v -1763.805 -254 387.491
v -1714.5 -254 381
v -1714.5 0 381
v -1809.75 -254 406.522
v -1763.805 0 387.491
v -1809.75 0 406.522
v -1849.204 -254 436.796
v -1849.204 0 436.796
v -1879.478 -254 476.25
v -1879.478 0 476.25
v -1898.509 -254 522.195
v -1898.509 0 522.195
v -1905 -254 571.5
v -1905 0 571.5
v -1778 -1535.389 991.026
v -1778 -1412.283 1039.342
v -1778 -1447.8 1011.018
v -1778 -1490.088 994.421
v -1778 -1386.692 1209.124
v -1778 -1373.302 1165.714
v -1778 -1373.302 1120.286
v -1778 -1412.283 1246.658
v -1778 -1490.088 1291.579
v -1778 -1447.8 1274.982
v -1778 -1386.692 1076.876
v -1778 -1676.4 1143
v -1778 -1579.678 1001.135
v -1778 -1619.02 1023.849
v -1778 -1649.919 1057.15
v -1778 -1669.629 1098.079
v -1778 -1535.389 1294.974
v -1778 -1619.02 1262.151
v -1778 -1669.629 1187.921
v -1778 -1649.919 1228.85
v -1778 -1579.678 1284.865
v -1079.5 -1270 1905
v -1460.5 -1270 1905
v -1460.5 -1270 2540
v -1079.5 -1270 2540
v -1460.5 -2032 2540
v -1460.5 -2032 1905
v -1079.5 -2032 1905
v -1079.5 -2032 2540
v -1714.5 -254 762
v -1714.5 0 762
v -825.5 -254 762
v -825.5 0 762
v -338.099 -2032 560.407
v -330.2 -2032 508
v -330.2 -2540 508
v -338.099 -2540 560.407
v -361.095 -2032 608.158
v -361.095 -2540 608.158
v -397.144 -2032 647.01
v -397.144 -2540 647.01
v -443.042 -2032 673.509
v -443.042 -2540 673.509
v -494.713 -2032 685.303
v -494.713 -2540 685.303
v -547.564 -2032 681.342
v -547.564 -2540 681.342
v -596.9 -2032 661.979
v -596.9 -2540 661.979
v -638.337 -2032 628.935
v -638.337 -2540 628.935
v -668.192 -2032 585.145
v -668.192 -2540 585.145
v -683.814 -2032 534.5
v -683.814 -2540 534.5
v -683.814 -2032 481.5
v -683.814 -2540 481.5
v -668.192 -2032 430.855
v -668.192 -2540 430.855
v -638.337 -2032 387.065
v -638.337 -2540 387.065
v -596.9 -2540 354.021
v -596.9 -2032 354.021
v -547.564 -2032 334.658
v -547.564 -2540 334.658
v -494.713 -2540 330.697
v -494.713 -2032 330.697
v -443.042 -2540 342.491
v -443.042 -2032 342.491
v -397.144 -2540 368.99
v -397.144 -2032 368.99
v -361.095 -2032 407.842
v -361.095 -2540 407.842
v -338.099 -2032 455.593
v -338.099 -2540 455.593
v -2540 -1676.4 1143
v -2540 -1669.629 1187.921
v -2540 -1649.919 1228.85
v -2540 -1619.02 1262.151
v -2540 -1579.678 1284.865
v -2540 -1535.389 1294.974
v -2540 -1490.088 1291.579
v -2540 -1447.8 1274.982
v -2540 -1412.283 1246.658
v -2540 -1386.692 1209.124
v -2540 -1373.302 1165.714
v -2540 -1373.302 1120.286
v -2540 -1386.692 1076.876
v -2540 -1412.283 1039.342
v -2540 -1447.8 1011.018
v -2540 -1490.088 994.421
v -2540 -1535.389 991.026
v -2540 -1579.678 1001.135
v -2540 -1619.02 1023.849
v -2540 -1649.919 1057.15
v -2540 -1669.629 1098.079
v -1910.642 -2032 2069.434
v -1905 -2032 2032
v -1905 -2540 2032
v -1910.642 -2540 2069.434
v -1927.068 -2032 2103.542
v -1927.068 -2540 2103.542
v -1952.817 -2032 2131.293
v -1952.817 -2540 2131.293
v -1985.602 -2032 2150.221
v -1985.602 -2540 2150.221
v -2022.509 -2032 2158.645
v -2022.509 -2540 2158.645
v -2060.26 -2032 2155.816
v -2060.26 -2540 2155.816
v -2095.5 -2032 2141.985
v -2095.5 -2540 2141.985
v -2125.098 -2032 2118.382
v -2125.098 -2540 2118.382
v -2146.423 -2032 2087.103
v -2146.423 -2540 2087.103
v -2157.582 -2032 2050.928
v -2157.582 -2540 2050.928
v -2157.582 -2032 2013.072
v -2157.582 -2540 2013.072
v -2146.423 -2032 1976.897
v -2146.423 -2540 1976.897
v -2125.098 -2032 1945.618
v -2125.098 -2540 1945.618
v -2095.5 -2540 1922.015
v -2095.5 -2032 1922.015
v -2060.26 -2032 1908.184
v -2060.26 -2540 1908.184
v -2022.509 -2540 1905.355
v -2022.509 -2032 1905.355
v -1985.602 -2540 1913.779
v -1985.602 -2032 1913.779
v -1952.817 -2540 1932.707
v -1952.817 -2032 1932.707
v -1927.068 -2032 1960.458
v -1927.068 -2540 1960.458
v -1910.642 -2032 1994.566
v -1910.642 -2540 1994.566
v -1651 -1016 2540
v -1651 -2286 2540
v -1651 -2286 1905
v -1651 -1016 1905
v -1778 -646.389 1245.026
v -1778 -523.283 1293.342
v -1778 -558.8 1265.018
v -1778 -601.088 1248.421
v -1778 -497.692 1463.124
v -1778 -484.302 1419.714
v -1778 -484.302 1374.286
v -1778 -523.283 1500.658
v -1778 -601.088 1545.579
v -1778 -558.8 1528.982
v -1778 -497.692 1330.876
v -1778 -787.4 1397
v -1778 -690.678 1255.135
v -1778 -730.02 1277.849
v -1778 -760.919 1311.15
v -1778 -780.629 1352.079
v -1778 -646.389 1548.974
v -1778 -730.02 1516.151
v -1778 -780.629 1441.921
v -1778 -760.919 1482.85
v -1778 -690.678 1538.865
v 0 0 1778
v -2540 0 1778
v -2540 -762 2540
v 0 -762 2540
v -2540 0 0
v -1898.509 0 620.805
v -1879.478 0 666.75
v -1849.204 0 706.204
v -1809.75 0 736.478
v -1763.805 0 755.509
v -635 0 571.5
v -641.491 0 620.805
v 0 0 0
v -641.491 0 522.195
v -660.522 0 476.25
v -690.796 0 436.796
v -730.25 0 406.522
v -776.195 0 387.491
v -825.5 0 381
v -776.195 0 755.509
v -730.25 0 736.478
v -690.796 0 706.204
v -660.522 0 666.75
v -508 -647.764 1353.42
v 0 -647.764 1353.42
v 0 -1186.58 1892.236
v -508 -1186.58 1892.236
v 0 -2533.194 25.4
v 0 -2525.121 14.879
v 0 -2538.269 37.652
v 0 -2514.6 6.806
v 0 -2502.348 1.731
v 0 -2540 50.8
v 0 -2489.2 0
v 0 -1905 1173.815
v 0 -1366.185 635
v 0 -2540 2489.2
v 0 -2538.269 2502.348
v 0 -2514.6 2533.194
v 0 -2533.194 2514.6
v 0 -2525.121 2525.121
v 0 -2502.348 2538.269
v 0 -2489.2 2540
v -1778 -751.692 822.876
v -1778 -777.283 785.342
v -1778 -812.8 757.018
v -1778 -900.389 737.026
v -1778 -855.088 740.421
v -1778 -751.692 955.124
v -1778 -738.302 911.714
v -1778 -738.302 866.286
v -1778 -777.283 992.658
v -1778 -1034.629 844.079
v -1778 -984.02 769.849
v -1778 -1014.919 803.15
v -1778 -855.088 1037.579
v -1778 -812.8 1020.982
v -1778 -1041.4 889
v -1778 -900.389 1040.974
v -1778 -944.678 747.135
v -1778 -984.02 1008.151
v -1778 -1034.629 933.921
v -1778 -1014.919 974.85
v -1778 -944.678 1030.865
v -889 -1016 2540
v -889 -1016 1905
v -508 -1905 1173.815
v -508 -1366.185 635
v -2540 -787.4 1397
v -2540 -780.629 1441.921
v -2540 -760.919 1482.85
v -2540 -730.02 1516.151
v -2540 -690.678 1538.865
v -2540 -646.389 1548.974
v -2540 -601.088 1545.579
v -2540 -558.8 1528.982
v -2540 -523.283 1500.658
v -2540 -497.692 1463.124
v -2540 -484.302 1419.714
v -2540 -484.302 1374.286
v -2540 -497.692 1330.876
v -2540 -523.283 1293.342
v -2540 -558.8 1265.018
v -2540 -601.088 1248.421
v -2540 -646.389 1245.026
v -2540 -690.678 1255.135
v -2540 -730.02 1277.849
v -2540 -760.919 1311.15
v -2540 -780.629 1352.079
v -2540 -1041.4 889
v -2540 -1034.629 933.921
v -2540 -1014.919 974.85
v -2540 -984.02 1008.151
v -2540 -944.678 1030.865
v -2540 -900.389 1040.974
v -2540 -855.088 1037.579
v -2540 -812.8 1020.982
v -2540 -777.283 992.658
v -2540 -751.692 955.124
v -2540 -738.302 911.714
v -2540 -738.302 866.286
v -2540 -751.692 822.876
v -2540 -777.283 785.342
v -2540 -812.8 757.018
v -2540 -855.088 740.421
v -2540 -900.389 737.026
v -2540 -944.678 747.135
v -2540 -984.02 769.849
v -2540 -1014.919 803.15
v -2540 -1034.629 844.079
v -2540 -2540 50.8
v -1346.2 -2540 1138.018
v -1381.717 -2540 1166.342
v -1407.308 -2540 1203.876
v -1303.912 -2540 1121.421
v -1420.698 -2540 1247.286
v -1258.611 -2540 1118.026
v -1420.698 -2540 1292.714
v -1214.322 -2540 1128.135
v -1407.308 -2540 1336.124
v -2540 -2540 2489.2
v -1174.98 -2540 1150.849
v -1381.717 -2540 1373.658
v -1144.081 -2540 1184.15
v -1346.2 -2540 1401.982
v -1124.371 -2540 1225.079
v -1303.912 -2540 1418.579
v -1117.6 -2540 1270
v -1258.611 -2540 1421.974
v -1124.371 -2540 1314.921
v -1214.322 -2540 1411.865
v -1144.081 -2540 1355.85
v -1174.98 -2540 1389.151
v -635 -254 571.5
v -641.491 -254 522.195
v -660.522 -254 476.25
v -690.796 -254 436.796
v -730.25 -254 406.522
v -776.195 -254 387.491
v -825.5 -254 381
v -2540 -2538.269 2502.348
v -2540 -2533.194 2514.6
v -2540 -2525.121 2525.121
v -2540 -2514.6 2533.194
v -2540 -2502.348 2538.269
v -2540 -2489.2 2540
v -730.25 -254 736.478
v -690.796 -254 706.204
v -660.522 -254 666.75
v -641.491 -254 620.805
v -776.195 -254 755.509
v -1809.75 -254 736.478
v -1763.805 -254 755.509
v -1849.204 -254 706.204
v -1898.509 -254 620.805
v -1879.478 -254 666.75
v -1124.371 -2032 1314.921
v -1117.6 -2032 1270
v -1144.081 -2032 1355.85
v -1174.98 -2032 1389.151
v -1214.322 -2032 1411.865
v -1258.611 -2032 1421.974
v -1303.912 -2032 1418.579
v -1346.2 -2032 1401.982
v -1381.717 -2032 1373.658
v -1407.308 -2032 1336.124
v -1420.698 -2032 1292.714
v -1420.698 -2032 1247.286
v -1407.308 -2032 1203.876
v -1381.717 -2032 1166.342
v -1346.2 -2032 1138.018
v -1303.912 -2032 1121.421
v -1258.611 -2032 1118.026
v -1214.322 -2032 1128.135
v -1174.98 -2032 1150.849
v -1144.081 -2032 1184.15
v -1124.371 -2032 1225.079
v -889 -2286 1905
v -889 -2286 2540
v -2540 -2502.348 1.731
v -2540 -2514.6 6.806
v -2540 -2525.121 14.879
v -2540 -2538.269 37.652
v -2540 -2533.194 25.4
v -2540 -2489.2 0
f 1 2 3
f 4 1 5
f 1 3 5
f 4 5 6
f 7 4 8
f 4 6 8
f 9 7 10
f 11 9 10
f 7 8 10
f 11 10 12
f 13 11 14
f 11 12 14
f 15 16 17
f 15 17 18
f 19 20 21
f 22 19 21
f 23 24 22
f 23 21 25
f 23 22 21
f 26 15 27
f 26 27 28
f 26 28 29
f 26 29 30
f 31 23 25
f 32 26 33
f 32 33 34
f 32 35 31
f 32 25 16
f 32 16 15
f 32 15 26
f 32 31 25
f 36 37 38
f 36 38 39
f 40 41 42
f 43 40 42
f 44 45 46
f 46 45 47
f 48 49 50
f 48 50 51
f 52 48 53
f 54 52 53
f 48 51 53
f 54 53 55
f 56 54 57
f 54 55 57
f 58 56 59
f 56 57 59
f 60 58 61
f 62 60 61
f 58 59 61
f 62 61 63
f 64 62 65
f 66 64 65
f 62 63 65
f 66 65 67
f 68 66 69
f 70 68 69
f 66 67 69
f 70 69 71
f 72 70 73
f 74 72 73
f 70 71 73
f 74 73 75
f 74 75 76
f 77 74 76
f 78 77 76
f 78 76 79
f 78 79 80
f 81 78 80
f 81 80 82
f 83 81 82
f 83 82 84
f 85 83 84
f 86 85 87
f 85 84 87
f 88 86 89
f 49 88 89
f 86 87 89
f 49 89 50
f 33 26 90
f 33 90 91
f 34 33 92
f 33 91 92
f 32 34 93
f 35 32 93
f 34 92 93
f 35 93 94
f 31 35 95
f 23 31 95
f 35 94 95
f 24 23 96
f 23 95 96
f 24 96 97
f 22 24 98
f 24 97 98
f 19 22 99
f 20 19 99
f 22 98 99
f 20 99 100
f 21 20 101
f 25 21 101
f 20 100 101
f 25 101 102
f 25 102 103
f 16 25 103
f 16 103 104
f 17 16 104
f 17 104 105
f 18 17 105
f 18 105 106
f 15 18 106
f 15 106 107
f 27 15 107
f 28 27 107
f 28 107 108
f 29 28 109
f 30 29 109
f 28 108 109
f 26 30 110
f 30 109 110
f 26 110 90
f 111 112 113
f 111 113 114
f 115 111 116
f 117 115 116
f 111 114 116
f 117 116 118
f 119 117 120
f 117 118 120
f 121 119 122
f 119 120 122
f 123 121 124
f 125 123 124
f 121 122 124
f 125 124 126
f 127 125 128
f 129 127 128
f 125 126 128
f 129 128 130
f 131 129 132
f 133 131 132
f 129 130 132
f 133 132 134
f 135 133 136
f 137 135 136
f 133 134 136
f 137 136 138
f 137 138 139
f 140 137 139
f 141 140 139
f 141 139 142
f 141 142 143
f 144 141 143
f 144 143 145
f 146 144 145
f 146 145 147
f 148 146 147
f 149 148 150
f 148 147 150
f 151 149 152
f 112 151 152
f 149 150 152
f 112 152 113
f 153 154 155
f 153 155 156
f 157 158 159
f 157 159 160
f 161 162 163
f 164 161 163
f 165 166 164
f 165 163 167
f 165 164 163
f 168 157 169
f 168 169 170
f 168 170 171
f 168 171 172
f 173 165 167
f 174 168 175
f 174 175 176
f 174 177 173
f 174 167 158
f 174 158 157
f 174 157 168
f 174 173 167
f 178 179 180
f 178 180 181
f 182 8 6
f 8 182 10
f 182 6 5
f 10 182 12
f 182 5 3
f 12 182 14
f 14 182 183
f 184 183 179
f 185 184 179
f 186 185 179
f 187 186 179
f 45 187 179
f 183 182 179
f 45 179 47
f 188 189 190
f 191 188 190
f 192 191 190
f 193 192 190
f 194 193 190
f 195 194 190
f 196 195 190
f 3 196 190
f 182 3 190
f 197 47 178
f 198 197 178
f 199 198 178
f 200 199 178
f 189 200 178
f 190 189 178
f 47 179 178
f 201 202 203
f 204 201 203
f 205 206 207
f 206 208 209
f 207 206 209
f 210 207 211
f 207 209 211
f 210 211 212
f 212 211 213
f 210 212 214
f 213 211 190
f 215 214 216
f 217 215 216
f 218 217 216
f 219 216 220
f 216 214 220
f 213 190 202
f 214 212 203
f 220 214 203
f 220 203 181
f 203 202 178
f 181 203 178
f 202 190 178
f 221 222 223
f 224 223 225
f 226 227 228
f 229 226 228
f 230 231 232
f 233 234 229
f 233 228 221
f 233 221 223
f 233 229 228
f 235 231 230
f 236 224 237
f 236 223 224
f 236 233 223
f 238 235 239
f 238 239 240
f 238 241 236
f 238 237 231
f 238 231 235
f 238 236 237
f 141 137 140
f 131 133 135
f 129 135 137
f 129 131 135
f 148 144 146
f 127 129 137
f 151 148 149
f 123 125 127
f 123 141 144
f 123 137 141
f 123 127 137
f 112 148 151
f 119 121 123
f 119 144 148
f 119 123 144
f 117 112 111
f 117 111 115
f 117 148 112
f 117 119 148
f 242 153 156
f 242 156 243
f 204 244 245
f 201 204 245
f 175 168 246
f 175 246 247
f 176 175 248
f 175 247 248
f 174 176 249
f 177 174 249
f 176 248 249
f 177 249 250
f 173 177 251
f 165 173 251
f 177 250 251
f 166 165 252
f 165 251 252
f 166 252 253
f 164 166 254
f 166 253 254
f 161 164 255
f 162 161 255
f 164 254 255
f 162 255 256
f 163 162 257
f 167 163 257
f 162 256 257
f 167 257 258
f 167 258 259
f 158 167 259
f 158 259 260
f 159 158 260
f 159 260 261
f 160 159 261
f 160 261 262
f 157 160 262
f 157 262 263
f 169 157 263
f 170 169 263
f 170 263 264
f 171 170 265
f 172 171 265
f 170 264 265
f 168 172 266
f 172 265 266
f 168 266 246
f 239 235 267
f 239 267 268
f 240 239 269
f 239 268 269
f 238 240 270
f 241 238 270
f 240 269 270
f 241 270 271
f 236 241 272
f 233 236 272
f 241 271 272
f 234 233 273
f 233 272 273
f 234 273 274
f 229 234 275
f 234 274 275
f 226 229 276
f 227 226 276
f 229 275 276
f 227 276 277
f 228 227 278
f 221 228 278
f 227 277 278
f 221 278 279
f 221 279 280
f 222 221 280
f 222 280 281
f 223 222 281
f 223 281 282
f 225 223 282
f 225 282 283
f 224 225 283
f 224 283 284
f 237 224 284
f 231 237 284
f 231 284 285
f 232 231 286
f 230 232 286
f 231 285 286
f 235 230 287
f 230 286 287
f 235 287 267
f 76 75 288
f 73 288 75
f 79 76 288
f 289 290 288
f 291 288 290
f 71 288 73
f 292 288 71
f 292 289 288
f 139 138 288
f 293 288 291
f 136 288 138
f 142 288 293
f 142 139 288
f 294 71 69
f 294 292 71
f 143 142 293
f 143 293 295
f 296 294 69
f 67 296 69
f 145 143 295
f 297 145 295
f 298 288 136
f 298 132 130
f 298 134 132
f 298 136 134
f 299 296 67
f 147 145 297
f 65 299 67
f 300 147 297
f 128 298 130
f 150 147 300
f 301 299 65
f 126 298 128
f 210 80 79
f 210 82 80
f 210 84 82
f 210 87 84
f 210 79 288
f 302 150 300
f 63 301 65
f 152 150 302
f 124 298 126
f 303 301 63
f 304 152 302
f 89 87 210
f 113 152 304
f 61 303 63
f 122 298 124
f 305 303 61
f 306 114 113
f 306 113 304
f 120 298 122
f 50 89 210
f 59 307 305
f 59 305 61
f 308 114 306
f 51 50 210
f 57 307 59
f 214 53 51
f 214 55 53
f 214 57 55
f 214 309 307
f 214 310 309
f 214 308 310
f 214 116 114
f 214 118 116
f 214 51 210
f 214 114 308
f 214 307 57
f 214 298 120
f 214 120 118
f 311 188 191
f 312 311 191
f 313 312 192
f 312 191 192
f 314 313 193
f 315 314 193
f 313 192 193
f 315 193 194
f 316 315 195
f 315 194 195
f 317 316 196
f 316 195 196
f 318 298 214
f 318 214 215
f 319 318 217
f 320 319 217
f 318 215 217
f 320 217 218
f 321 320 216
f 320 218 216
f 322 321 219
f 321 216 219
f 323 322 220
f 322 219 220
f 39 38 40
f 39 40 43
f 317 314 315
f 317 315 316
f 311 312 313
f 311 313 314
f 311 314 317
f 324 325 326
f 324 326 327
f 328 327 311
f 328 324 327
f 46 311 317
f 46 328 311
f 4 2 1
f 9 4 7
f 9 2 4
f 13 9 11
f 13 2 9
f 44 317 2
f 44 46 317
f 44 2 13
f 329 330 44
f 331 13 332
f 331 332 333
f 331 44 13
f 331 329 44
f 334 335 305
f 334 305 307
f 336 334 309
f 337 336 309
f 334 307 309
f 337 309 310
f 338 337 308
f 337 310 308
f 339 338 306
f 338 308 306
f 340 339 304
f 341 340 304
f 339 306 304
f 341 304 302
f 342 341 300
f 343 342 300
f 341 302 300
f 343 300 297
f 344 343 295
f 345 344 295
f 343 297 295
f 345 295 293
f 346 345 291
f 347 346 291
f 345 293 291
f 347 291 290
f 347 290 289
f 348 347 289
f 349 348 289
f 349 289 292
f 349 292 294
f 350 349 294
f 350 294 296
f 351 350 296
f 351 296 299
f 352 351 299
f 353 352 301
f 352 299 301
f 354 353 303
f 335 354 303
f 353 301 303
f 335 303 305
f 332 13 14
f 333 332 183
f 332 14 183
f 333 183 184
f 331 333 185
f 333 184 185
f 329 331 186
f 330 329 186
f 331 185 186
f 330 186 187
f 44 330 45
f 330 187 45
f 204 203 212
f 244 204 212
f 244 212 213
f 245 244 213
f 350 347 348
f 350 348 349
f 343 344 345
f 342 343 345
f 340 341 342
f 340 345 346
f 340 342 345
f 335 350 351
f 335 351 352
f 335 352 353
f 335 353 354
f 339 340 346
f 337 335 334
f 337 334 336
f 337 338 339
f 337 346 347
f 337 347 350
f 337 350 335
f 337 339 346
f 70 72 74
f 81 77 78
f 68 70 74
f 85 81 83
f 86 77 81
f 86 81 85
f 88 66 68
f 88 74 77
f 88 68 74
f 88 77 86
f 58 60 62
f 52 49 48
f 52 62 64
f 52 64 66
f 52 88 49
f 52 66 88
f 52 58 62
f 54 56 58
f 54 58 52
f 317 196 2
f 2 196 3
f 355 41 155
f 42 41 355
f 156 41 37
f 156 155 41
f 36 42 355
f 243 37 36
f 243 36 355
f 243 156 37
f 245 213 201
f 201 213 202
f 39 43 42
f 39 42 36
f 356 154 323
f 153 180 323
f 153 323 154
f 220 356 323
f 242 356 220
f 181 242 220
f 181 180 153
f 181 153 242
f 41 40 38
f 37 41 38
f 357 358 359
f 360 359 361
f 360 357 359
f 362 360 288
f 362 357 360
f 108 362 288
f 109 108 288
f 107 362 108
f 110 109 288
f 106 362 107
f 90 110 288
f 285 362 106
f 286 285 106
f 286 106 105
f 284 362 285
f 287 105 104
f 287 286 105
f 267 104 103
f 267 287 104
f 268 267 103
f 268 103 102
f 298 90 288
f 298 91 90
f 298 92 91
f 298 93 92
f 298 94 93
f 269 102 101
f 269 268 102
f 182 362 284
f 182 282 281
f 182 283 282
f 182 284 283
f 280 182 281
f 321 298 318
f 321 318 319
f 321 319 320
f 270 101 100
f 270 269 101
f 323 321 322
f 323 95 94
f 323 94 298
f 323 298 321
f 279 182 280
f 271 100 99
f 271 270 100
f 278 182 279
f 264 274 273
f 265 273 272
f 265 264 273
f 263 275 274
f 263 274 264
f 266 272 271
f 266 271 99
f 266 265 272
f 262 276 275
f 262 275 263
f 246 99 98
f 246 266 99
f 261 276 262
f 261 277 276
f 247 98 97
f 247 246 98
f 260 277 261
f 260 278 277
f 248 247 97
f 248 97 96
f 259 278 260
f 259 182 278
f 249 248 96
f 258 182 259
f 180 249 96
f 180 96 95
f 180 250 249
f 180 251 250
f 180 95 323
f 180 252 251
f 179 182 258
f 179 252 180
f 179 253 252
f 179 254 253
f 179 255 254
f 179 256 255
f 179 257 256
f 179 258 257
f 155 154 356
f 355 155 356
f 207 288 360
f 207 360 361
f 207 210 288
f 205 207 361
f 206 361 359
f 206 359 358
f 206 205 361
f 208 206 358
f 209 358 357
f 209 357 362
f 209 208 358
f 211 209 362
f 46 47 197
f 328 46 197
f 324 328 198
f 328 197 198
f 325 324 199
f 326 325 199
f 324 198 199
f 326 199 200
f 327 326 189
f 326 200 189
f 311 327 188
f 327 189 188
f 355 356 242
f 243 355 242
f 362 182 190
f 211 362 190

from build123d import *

# Parameters (mm, degrees)
F0_W      = 2540
F0_H      = 2540
F1_DEPTH  = 2540
F2_SIZE2  = 762
F2_SIZE   = 762
F3_W      = 762
F3_H      = 1270
F3_W_2    = 381
F3_H_2    = 762
F4_DEPTH  = 635
F6_DEPTH  = 508
F7_R      = 127
F7_R_2    = 152.4
F7_R_3    = 177.8
F8_DEPTH  = 508
F11_DEPTH = 254
F12_R     = 50.8
F13_R     = 50.8
F9_R      = 152.4
F14_DEPTH = 762


with BuildPart() as f1:
    # F0 (on Front) → F1 (new body)
    with BuildSketch(Plane.XZ):
        with Locations((-1270, 1270)):
            Rectangle(F0_W, F0_H)
    extrude(amount=F1_DEPTH)

    # F2
    f2_edges = [f1.edges().sort_by_distance(p)[0] for p in [
        (-1270, 0, 2540),
    ]]
    chamfer(f2_edges, length=F2_SIZE, length2=F2_SIZE2)

    # F3 (on face) → F4 (cut)
    with BuildSketch(Plane.XY.offset(2540)):
        with Locations((-1270, -1651)):
            Rectangle(F3_W, F3_H)
        with Locations((-1270, -1651)):
            Rectangle(F3_W_2, F3_H_2, mode=Mode.SUBTRACT)
    extrude(amount=-F4_DEPTH, mode=Mode.SUBTRACT)

    # F5 (on face) → F6 (cut)
    with BuildSketch(Plane.YZ):
        Polygon((-647.764143, 1353.42049), (-1186.57951, 1892.235857), (-1905, 1173.815367), (-1366.184633, 635), align=None)
    extrude(amount=-F6_DEPTH, mode=Mode.SUBTRACT)

    # F7 (on face) → F8 (cut)
    with BuildSketch(Plane.XZ.offset(2540)):
        with Locations((-2032, 2032)):
            Circle(F7_R)
        with Locations((-1270, 1270)):
            Circle(F7_R_2)
        with Locations((-508, 508)):
            Circle(F7_R_3)
    extrude(amount=-F8_DEPTH, mode=Mode.SUBTRACT)

    # F10 (on face) → F11 (cut)
    with BuildSketch(Plane(origin=(0, 0, 0), x_dir=(-1, 0, 0), z_dir=(0, 1, 0))):
        with BuildLine():
            Line((1714.5, 762), (825.5, 762))
            ThreePointArc((825.5, 762), (690.796158, 706.203842), (635, 571.5))
            ThreePointArc((635, 571.5), (690.796158, 436.796158), (825.5, 381))
            Line((825.5, 381), (1714.5, 381))
            ThreePointArc((1714.5, 381), (1849.203842, 436.796158), (1905, 571.5))
            ThreePointArc((1905, 571.5), (1849.203842, 706.203842), (1714.5, 762))
        make_face()
    extrude(amount=-F11_DEPTH, mode=Mode.SUBTRACT)

    # F12
    f12_edges = [f1.edges().sort_by_distance(p)[0] for p in [
        (-1270, -2540, 0),
    ]]
    fillet(f12_edges, radius=F12_R)

    # F13
    f13_edges = [f1.edges().sort_by_distance(p)[0] for p in [
        (-1270, -2540, 2540),
    ]]
    fillet(f13_edges, radius=F13_R)

    # F9 (on face) → F14 (cut)
    with BuildSketch(Plane(origin=(-2540, 0, 0), x_dir=(0, -1, 0), z_dir=(-1, 0, 0))):
        with Locations((635, 1397)):
            Circle(F9_R)
        with Locations((889, 889)):
            Circle(F9_R)
        with Locations((1524, 1143)):
            Circle(F9_R)
    extrude(amount=-F14_DEPTH, mode=Mode.SUBTRACT)


solid = f1.part
